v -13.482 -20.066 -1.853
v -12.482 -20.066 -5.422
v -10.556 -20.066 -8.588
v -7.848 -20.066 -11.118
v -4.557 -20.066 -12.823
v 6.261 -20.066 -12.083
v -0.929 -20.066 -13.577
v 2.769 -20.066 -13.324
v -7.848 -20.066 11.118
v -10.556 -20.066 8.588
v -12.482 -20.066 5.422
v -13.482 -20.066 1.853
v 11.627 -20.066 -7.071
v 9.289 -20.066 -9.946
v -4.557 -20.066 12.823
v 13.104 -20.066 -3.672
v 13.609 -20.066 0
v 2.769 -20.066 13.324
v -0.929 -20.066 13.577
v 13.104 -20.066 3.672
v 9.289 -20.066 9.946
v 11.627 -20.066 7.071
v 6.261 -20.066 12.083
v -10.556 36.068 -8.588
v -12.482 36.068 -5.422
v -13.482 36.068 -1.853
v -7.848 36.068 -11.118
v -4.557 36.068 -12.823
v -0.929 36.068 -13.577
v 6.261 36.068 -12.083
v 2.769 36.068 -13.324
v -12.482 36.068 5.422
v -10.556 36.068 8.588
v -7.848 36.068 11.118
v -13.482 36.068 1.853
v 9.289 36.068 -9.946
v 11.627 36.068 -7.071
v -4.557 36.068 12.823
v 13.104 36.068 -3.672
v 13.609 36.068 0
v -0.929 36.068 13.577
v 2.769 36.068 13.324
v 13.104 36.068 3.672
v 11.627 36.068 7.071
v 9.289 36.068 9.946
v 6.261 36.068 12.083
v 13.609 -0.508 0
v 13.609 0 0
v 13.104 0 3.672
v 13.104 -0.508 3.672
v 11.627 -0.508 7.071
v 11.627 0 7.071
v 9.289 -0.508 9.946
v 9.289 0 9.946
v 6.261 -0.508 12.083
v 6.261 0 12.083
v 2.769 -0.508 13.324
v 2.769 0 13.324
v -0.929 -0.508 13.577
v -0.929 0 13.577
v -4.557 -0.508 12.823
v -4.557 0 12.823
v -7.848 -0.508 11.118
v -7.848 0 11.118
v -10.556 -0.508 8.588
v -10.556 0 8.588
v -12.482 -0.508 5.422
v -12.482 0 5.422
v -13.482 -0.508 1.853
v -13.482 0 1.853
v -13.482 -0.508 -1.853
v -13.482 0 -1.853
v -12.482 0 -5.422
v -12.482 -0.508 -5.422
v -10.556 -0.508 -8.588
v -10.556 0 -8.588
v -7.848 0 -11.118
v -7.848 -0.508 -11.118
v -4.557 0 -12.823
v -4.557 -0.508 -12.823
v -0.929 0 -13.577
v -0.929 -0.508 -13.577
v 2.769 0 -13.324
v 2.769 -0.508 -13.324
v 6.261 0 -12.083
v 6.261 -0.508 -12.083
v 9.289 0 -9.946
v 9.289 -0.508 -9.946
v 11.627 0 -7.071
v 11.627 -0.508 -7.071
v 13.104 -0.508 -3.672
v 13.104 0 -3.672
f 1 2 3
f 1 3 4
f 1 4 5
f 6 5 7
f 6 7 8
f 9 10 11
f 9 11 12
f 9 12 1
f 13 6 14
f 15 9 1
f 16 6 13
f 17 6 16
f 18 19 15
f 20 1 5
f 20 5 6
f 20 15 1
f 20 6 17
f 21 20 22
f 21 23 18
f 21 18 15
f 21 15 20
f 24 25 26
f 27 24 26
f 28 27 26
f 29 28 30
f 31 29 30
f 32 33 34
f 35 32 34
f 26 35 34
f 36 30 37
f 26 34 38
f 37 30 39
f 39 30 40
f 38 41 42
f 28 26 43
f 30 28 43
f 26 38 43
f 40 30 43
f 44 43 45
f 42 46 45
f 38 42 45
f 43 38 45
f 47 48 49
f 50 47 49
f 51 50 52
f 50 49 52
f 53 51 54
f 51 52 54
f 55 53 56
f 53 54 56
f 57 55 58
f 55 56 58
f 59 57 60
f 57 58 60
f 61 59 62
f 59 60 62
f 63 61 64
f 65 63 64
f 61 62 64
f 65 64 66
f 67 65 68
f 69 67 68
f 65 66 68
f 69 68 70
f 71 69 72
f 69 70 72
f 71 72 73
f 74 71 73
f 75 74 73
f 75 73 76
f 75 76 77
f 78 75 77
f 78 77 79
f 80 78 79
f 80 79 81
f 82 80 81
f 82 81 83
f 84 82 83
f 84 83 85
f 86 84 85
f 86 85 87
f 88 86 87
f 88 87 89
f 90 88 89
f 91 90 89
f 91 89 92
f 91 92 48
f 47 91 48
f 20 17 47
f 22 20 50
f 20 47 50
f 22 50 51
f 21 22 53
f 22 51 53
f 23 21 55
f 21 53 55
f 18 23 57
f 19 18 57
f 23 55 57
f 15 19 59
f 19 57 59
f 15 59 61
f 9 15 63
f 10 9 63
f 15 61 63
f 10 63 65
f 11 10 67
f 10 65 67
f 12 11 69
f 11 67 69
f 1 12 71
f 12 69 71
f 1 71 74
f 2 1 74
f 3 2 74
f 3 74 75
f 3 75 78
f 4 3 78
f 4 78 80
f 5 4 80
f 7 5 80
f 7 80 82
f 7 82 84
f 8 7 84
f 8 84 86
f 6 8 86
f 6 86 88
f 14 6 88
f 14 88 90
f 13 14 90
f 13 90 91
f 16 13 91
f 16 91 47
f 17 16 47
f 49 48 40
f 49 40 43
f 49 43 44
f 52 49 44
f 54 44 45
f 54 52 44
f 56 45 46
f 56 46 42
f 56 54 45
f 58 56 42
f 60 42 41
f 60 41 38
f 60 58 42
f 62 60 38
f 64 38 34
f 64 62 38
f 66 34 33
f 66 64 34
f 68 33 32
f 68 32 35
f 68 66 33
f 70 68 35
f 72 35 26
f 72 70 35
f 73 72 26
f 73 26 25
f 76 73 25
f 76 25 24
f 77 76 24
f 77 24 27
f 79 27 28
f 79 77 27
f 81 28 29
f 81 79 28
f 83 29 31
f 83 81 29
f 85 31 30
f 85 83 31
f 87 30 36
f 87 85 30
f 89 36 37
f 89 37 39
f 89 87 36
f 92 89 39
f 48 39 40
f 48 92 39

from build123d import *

# Parameters (mm, degrees)
F1_R     = 13.608601514
F2_DEPTH = 36.068
F4_DEPTH = 36.576
F5_DEPTH = 56.134


# Not quite as in the source:
# - the program builds the solid bodies; features that only make, move or delete a surface that nothing else refers to are left out


with BuildPart() as f2:
    # F1 (on Front) → F2 (new body)
    with BuildSketch(Plane.XZ):
        Circle(F1_R)
    extrude(amount=-F2_DEPTH)

    # F4 (add): a face of the model
    f4_faces = [f2.faces().sort_by_distance(p)[0] for p in [
        (0, 36.068, 0),
    ]]
    extrude(f4_faces, amount=-F4_DEPTH)

    # F5 (add): a face of the model
    f5_faces = [f2.faces().sort_by_distance(p)[0] for p in [
        (0, 36.068, 0),
    ]]
    extrude(f5_faces, amount=-F5_DEPTH)


solid = f2.part
